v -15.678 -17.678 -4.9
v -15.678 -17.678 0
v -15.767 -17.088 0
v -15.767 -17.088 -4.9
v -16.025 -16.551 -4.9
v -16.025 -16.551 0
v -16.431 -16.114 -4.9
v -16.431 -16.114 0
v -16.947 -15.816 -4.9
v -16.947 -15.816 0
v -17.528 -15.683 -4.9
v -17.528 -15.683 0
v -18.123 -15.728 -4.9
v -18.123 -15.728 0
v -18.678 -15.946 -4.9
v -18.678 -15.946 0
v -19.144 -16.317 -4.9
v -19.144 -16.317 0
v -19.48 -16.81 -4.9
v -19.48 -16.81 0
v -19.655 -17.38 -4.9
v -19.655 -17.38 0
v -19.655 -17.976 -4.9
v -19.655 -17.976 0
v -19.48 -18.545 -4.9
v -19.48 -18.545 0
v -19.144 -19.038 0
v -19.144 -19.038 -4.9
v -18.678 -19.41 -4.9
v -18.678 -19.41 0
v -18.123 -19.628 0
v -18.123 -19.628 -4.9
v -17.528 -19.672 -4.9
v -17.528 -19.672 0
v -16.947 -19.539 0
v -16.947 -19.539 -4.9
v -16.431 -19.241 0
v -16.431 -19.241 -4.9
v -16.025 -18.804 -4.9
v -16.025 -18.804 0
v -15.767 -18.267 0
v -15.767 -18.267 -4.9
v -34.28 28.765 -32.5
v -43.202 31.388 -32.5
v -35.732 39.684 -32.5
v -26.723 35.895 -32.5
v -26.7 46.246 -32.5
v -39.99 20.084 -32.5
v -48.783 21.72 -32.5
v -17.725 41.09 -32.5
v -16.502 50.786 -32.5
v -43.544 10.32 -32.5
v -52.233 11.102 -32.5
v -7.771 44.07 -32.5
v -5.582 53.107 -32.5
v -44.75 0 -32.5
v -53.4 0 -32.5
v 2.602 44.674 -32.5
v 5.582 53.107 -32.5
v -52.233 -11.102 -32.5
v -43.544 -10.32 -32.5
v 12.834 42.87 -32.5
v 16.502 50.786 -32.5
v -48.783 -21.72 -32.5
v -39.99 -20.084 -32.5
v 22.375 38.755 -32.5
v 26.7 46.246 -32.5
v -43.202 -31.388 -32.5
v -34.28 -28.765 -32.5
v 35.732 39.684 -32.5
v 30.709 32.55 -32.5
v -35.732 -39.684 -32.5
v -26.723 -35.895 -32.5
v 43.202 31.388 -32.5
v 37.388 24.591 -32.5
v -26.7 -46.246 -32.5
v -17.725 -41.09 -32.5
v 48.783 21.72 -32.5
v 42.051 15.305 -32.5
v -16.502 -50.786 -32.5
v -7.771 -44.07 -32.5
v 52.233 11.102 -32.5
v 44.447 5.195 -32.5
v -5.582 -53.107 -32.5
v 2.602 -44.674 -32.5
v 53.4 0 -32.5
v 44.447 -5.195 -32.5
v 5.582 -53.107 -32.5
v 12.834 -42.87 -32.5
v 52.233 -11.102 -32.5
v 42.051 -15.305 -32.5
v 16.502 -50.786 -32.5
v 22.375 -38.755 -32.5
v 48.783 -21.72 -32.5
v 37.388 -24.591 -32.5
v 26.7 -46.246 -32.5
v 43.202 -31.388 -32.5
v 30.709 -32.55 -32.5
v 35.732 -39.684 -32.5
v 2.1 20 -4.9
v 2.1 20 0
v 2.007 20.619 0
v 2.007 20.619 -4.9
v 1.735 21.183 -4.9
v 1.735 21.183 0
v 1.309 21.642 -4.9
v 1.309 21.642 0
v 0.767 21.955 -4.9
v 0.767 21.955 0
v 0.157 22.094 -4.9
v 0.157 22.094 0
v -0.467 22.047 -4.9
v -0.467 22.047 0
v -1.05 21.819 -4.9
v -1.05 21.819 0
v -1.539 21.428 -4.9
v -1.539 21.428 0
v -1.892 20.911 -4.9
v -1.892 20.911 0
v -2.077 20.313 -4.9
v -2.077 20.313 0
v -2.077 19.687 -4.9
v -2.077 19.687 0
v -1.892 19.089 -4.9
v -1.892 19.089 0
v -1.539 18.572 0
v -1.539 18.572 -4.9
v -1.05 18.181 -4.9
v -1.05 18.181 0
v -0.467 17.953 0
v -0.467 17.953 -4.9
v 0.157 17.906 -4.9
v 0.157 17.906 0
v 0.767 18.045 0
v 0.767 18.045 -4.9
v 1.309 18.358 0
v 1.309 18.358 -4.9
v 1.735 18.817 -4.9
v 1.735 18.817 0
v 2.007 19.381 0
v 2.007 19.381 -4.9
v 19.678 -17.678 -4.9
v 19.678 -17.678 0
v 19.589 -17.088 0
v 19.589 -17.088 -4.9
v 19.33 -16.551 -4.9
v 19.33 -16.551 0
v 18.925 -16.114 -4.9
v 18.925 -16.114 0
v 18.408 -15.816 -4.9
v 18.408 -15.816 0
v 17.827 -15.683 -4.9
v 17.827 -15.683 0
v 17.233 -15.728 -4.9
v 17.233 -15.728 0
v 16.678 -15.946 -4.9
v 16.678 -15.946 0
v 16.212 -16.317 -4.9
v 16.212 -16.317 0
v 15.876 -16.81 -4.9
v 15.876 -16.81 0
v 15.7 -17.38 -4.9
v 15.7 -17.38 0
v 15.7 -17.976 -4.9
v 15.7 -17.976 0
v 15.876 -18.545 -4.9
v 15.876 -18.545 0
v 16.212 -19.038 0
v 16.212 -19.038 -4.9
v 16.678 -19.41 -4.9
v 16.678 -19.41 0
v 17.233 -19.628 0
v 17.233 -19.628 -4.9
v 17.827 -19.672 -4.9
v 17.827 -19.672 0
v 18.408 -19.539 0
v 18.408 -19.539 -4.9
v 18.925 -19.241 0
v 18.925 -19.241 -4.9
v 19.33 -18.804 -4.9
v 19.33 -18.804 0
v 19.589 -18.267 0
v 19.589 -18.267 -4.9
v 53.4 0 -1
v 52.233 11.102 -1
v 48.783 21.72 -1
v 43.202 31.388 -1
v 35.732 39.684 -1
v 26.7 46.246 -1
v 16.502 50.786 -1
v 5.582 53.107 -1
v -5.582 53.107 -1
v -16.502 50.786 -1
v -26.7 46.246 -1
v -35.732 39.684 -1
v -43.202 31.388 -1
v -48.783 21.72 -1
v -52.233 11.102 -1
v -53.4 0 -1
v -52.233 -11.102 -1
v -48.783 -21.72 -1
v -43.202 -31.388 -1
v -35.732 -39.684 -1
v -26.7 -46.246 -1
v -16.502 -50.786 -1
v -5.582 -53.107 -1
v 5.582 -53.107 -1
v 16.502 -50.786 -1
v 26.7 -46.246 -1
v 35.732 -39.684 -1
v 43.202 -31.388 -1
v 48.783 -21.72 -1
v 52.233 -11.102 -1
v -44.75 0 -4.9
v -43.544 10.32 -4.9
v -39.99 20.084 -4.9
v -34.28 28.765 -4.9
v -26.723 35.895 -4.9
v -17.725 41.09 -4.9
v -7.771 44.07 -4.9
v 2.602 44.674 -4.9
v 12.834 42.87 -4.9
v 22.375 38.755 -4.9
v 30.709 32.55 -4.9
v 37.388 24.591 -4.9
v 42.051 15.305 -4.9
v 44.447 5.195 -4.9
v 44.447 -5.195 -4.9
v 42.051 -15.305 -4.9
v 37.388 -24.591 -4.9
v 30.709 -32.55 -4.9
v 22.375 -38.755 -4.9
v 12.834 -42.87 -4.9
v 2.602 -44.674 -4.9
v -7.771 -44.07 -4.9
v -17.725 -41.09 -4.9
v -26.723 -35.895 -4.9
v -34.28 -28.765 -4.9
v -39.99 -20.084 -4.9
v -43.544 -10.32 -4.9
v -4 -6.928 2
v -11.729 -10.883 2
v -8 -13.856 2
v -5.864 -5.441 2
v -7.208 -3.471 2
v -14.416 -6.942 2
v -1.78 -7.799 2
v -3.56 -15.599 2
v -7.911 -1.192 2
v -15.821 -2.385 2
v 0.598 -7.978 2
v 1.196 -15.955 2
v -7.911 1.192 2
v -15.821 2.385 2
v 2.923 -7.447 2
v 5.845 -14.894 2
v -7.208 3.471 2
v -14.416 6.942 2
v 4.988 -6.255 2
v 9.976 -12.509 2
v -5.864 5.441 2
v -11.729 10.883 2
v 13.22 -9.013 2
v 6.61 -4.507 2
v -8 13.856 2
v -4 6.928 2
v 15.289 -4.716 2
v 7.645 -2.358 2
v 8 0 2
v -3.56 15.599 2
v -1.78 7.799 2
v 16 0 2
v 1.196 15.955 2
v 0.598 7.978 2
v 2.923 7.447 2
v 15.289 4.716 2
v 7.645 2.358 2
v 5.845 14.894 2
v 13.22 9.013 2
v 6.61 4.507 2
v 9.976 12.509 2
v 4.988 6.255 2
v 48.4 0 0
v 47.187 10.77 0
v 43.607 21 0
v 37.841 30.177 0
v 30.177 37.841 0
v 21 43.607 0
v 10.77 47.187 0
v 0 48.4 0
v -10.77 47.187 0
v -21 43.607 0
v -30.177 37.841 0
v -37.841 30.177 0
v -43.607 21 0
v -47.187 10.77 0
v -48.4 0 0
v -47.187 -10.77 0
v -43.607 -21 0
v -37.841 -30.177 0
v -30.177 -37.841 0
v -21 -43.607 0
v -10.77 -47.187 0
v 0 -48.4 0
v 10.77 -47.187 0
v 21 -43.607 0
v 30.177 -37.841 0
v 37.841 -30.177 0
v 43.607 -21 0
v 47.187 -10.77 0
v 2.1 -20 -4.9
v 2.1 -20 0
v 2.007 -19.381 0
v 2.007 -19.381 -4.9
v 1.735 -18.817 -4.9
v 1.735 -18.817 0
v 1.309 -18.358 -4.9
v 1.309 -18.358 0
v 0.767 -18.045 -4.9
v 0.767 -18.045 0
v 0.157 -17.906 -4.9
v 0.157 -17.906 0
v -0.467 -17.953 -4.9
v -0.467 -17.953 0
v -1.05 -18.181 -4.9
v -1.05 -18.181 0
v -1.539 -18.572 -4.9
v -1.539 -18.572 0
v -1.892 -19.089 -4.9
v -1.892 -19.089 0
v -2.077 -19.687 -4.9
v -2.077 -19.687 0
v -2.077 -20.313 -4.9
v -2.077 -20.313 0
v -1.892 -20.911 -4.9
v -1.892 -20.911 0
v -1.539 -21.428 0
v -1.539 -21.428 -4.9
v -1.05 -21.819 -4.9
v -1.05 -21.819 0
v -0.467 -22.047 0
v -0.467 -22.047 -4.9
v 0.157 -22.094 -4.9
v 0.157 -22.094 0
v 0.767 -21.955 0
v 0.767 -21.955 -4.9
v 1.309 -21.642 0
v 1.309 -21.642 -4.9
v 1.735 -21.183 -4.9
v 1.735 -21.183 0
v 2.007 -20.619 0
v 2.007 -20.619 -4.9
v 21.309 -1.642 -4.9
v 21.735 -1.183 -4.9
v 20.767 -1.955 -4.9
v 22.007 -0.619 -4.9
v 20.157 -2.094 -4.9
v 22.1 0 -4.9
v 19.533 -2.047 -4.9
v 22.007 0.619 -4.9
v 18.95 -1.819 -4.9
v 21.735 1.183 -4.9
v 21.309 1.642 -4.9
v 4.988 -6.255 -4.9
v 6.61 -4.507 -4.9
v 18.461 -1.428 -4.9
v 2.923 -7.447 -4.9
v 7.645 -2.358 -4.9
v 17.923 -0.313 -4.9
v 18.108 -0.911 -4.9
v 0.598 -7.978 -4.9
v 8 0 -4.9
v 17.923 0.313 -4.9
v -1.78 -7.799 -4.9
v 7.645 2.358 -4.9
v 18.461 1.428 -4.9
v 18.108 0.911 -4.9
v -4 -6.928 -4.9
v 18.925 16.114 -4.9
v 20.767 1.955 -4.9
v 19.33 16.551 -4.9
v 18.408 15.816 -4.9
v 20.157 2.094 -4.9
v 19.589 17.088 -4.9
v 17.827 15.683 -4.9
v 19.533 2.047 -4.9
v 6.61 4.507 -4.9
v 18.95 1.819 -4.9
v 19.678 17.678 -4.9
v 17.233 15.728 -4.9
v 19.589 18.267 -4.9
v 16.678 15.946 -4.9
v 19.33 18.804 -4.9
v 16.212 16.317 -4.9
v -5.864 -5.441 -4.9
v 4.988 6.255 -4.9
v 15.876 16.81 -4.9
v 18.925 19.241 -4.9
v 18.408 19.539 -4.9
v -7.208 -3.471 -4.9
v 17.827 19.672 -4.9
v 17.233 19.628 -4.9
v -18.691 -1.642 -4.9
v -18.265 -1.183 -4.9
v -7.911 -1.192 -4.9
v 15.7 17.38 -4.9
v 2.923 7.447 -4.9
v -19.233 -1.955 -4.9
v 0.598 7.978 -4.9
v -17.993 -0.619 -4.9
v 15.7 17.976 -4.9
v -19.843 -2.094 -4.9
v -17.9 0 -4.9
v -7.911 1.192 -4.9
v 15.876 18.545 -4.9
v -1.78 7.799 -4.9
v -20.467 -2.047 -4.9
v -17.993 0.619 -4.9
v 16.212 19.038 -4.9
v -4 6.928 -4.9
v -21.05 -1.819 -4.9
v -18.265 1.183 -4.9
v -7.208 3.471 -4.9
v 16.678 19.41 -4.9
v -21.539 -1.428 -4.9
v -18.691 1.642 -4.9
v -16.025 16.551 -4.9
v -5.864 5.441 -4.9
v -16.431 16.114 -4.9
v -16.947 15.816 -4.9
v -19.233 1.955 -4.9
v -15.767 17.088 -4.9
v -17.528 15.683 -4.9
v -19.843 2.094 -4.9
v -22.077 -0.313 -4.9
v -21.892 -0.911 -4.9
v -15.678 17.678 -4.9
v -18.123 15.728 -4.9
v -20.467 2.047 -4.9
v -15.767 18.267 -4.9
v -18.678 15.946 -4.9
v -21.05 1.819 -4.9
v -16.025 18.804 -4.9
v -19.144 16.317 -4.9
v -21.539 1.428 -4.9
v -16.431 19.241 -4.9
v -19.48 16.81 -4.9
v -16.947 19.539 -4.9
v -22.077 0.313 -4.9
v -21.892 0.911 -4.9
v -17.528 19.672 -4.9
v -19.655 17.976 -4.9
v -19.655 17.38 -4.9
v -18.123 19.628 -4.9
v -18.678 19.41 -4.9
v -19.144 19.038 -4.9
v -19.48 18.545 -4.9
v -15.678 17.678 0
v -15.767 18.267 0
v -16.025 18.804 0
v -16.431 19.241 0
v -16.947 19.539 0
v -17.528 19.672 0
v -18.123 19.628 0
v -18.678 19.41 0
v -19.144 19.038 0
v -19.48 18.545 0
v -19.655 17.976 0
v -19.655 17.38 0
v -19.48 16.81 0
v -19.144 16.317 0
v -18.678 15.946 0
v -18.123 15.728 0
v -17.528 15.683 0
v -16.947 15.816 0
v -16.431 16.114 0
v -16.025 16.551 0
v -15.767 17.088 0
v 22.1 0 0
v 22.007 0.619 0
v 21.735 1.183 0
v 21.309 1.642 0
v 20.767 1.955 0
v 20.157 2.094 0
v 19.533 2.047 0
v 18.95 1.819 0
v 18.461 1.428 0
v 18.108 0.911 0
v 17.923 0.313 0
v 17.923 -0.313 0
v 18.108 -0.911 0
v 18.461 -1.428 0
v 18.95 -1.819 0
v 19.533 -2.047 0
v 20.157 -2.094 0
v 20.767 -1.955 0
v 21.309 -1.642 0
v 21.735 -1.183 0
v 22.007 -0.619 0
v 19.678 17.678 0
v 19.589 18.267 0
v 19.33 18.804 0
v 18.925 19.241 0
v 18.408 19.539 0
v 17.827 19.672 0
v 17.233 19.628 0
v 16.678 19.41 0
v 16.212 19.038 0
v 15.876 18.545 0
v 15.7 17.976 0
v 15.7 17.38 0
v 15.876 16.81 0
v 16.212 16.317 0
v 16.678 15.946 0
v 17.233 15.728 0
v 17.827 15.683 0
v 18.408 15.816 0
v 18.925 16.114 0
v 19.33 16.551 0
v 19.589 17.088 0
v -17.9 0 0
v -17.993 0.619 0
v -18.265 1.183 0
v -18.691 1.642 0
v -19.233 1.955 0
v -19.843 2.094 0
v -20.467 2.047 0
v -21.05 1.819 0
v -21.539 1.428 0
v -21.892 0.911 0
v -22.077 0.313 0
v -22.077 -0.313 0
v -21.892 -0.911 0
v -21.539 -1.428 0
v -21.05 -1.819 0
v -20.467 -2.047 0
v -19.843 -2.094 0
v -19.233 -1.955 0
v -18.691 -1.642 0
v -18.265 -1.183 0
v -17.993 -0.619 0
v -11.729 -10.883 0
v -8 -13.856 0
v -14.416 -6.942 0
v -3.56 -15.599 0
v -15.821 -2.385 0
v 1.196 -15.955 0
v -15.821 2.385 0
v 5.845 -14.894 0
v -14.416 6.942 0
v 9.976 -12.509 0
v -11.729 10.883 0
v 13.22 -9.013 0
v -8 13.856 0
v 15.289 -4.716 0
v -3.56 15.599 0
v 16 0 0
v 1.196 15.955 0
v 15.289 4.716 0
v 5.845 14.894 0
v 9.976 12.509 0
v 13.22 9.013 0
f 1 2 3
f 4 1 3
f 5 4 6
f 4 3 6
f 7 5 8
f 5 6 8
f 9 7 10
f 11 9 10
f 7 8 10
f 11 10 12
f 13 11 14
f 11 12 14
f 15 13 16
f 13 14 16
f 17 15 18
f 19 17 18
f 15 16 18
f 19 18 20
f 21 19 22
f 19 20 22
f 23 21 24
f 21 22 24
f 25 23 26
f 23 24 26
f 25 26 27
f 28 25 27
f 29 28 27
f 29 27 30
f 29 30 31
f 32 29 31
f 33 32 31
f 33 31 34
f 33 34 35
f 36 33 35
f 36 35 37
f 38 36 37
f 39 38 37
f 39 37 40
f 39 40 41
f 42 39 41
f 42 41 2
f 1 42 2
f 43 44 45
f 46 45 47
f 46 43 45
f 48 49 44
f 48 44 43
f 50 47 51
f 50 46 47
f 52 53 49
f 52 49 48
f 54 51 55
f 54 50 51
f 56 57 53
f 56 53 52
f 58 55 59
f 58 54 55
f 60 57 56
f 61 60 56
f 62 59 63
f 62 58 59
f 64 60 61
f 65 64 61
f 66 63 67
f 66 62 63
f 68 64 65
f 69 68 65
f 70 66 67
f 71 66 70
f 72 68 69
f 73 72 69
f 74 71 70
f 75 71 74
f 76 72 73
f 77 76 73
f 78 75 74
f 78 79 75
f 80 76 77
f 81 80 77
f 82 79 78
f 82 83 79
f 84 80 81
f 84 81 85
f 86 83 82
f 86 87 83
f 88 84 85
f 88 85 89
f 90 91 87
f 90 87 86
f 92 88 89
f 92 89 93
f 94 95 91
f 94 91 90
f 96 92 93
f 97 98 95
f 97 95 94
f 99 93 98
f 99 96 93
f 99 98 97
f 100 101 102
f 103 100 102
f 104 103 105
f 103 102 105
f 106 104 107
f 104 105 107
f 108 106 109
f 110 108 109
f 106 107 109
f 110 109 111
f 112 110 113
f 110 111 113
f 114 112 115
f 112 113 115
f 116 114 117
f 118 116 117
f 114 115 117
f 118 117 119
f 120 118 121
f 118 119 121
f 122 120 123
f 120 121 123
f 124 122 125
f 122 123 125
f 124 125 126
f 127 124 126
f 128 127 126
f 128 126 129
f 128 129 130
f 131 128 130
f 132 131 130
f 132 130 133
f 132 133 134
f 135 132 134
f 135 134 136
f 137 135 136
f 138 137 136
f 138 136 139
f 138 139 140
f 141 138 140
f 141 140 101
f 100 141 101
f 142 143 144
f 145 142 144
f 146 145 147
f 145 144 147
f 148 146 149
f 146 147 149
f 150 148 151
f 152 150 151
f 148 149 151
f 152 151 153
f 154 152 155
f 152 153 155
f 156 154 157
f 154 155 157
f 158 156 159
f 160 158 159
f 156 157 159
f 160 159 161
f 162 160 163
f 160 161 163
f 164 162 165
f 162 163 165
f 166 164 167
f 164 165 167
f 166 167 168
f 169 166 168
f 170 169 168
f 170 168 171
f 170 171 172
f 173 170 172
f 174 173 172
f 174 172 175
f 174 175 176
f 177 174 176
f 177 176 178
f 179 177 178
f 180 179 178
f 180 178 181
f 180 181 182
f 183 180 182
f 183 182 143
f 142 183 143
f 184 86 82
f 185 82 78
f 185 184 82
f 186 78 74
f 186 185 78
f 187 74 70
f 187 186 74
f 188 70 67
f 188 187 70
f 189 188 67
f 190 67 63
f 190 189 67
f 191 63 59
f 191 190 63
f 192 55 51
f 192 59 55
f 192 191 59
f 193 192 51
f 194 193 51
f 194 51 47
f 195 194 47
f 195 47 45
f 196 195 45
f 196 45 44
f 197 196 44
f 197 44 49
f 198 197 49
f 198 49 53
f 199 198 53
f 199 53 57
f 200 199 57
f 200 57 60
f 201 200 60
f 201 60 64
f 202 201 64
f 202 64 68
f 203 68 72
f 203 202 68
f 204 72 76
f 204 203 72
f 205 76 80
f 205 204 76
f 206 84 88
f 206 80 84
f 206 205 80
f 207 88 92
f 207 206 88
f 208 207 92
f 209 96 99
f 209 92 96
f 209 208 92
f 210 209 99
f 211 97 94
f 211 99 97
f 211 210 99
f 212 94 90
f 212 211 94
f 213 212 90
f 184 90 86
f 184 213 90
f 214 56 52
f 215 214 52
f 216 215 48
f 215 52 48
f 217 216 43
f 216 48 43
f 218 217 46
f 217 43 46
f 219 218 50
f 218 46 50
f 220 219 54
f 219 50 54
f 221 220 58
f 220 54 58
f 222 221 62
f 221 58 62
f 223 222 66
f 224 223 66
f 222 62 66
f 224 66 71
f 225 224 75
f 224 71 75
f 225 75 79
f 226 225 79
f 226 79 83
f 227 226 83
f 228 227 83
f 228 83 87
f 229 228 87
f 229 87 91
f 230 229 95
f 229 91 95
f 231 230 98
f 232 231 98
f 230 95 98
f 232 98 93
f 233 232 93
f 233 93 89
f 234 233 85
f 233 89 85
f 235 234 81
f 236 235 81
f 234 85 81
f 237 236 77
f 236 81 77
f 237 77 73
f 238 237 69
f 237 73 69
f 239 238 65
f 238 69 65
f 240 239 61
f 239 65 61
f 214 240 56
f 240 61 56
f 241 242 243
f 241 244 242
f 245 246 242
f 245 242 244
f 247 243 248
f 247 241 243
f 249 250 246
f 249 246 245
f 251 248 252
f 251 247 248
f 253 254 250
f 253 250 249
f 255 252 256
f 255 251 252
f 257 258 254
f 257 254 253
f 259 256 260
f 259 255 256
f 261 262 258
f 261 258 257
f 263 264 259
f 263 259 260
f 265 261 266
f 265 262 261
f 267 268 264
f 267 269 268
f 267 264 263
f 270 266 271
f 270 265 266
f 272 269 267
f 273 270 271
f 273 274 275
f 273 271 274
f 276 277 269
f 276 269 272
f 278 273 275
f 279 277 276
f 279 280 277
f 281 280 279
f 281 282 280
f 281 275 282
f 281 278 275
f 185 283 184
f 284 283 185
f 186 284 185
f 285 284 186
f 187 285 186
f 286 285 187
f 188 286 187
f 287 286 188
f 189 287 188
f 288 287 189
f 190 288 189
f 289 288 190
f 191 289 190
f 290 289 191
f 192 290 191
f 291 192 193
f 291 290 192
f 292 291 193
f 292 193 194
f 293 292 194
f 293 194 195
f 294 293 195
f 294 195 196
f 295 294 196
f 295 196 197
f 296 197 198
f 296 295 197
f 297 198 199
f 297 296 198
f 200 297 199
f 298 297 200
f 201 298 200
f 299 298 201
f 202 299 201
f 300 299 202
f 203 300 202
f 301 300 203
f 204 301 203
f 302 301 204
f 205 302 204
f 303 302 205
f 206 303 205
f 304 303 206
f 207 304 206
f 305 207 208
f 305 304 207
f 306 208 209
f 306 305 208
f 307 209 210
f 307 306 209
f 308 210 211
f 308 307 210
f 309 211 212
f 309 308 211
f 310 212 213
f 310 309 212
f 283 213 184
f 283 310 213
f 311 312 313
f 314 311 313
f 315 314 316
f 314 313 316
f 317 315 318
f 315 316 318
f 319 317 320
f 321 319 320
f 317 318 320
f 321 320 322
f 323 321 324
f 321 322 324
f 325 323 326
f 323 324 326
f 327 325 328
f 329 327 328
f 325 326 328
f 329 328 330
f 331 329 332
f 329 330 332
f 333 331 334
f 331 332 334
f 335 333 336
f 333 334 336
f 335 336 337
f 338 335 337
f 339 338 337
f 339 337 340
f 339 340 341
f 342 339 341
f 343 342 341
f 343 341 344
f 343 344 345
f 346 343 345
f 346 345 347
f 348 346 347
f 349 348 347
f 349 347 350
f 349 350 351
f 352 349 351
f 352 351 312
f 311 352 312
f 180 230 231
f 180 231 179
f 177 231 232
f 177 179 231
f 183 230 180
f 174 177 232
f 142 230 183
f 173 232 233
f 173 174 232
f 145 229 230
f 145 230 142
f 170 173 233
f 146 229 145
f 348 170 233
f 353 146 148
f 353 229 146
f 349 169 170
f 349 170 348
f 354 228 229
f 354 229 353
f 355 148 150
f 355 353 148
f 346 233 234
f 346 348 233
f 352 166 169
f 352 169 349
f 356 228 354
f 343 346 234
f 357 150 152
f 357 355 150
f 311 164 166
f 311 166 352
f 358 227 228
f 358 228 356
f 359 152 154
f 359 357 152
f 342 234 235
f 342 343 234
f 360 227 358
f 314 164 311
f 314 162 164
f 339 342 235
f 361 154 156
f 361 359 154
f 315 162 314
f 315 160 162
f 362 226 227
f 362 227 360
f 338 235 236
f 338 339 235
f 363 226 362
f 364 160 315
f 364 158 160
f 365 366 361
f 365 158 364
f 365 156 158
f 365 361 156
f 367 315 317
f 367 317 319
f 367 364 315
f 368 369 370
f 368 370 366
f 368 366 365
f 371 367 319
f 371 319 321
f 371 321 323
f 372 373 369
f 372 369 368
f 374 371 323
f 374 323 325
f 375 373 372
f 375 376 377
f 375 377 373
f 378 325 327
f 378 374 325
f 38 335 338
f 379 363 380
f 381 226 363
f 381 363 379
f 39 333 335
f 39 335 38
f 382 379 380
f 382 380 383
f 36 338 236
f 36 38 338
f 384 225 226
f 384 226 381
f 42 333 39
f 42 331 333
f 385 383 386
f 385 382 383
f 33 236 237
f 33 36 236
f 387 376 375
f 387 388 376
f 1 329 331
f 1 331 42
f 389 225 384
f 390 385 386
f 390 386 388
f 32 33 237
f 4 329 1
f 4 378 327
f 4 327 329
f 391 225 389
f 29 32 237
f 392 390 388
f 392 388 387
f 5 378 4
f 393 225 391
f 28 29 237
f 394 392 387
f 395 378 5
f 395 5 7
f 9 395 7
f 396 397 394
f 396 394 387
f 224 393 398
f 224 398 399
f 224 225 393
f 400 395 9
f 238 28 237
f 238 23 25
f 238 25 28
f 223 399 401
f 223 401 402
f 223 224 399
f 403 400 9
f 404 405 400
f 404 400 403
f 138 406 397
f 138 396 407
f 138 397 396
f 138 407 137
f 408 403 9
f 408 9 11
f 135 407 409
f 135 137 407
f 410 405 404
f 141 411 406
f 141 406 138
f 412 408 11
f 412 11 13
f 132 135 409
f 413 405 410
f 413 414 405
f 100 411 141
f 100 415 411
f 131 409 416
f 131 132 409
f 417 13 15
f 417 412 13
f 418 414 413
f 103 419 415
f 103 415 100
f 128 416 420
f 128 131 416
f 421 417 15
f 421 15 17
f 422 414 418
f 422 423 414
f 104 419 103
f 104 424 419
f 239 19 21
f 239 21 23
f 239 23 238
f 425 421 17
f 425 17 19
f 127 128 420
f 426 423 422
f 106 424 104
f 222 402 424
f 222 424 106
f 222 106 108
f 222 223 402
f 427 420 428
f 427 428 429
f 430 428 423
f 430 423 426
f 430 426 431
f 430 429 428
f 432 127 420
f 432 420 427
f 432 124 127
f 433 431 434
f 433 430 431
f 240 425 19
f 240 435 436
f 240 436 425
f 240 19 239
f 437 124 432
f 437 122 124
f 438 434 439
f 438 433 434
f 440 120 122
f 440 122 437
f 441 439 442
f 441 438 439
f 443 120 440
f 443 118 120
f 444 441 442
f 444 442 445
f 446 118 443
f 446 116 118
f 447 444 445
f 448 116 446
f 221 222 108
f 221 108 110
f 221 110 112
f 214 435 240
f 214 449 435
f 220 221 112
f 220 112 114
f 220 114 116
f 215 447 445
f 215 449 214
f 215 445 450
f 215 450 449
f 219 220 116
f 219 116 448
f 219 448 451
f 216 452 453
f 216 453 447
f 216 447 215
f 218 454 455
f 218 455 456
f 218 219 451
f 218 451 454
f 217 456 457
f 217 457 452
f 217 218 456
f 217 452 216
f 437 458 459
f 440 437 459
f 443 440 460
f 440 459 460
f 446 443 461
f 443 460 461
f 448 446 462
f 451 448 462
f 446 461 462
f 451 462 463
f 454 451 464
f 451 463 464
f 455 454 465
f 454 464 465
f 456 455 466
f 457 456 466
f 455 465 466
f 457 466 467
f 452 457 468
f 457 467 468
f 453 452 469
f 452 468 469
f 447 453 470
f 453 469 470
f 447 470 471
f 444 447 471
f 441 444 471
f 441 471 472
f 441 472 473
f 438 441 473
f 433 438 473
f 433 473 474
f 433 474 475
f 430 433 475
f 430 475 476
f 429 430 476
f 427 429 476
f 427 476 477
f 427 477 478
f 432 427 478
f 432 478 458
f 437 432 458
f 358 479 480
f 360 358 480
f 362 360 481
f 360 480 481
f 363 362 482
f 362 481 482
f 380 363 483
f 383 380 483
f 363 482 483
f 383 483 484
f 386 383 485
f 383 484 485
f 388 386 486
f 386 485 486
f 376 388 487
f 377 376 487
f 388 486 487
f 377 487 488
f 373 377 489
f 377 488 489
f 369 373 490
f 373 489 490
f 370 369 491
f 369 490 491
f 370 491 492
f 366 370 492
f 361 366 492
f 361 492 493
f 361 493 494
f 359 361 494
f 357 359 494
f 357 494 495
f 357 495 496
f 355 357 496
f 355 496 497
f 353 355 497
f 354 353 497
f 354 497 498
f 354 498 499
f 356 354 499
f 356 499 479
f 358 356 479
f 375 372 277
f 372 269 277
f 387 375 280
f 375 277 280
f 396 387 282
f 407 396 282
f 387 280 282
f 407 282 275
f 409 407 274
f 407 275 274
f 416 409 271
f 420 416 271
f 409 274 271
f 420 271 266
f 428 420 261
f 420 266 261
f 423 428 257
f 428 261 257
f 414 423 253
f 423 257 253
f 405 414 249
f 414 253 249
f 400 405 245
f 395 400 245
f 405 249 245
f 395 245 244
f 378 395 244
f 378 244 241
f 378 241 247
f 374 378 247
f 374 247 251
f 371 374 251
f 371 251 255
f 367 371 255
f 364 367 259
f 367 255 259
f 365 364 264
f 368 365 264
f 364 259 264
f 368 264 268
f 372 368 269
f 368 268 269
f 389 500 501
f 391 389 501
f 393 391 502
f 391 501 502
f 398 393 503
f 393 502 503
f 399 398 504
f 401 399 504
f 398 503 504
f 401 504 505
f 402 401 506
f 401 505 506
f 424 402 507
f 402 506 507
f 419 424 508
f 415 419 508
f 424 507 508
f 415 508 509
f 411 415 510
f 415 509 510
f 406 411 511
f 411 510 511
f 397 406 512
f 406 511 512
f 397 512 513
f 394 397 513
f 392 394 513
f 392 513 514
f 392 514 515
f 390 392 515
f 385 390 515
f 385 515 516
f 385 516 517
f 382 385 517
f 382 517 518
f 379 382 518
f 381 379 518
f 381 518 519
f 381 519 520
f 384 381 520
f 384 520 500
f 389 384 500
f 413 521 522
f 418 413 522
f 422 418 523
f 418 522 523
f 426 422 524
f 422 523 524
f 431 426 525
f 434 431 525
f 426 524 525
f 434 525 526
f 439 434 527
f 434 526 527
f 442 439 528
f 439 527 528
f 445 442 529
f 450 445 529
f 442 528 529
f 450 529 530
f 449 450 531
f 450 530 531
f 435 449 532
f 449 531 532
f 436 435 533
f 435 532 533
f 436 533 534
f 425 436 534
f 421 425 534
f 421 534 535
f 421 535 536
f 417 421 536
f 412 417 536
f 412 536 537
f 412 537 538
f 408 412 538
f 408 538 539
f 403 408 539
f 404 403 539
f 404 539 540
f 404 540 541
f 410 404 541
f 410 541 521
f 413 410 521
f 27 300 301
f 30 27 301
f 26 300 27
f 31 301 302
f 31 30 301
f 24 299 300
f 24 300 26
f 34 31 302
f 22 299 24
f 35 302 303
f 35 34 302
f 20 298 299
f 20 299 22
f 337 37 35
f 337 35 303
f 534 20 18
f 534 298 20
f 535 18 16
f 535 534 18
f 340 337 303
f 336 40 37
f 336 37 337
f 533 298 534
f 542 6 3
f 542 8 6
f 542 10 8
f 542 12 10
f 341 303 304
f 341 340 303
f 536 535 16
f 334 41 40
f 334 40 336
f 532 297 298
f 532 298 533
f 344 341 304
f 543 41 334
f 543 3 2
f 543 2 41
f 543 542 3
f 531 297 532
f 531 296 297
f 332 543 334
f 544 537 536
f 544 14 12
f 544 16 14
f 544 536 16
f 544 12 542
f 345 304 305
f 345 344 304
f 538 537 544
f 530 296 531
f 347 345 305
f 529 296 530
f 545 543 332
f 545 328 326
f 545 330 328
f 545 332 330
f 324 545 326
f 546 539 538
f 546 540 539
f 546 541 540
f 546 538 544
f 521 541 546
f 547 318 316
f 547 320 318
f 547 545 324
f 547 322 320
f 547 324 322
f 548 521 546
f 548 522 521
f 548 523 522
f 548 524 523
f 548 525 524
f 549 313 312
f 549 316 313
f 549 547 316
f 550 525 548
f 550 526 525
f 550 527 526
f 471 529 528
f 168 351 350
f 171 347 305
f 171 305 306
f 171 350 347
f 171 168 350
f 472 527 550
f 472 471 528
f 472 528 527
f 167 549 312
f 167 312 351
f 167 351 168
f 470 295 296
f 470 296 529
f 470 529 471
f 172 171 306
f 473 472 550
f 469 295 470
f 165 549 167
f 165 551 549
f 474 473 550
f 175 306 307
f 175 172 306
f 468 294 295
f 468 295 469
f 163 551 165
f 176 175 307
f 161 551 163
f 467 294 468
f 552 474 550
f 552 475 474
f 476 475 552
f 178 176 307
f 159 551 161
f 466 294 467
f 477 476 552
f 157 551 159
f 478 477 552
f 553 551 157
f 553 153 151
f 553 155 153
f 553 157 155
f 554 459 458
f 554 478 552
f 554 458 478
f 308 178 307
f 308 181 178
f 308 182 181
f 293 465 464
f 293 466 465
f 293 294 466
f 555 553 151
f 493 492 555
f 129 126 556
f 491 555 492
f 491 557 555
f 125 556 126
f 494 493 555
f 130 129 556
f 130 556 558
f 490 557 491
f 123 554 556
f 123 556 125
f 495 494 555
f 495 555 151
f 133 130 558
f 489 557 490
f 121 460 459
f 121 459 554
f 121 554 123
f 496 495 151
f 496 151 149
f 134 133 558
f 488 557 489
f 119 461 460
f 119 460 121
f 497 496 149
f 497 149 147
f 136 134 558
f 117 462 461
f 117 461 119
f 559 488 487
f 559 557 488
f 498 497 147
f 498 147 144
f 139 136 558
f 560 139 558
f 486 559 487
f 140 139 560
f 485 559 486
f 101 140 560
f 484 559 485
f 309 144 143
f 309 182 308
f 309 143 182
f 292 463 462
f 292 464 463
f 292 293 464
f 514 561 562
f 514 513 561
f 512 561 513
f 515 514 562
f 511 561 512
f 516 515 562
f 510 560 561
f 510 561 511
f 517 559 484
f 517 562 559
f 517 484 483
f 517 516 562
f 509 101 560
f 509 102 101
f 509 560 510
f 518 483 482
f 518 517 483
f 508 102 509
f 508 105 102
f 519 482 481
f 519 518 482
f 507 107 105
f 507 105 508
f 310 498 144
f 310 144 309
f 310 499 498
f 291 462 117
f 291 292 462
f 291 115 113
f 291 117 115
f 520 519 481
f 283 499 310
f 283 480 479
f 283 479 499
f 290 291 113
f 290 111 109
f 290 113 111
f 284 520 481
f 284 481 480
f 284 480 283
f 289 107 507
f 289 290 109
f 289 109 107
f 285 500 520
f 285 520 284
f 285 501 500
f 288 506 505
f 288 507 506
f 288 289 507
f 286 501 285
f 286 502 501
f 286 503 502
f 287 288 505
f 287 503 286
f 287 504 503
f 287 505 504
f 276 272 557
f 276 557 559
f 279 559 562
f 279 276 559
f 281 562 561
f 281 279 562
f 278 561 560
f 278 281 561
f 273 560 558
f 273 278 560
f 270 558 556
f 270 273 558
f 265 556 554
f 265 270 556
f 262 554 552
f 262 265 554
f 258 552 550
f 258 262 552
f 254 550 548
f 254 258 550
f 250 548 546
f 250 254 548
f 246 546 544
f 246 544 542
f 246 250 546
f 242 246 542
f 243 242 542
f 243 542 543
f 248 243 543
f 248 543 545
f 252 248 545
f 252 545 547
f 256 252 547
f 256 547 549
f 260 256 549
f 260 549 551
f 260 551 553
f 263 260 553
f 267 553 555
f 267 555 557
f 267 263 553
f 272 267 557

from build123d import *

# Parameters (mm, degrees)
SKETCH3_R           = 53.4
BOSS_EXTRUDE1_DEPTH = 38.5
SKETCH4_R           = 8
CUT_EXTRUDE1_DEPTH  = 85.766561804
SKETCH5_R           = 2
CUT_EXTRUDE2_DEPTH  = 20
BOSS_EXTRUDE3_START = 2
SKETCH6_R           = 16
SKETCH6_R_2         = 8
BOSS_EXTRUDE3_DEPTH = 2
SKETCH7_R           = 2.1
CUT_EXTRUDE3_DEPTH  = 20
SKETCH8_R           = 2.5
CUT_EXTRUDE4_DEPTH  = 20
CHAMFER1_SIZE       = 1
CHAMFER1_SIZE2      = 5
CUT_EXTRUDE5_START  = -6
SKETCH9_R           = 53.4
CUT_EXTRUDE5_DEPTH  = 6
SKETCH10_R          = 44.75
CUT_EXTRUDE6_DEPTH  = 27.6


with BuildPart() as part:
    # Sketch3 → Boss-Extrude1 (new body)
    with BuildSketch(Plane.XY):
        Circle(SKETCH3_R)
    extrude(amount=-BOSS_EXTRUDE1_DEPTH)

    # Sketch4 → Cut-Extrude1 (cut, through all)
    with BuildSketch(Plane.XY):
        Circle(SKETCH4_R)
    extrude(amount=-CUT_EXTRUDE1_DEPTH, mode=Mode.SUBTRACT)

    # Sketch5 → Cut-Extrude2 (cut)
    with BuildSketch(Plane.XY):
        with Locations((-17.67766953, 17.67766953)):
            Circle(SKETCH5_R)
        with Locations((17.67766953, 17.67766953)):
            Circle(SKETCH5_R)
        with Locations((-17.67766953, -17.67766953)):
            Circle(SKETCH5_R)
        with Locations((17.67766953, -17.67766953)):
            Circle(SKETCH5_R)
    extrude(amount=-CUT_EXTRUDE2_DEPTH, mode=Mode.SUBTRACT)

    # Sketch6 → Boss-Extrude3 (add)
    with BuildSketch(Plane.XY.offset(BOSS_EXTRUDE3_START)):
        Circle(SKETCH6_R)
        Circle(SKETCH6_R_2, mode=Mode.SUBTRACT)
    extrude(amount=-BOSS_EXTRUDE3_DEPTH)

    # Sketch7 → Cut-Extrude3 (cut)
    with BuildSketch(Plane.XY):
        with Locations((0, 20)):
            Circle(SKETCH7_R)
        with Locations((20, 0)):
            Circle(SKETCH7_R)
        with Locations((-20, 0)):
            Circle(SKETCH7_R)
        with Locations((0, -20)):
            Circle(SKETCH7_R)
    extrude(amount=-CUT_EXTRUDE3_DEPTH, mode=Mode.SUBTRACT)

    # Sketch8 → Cut-Extrude4 (cut)
    with BuildSketch(Plane(origin=(0, 0, -38.5), x_dir=(-1, 0, 0), z_dir=(0, 0, -1))):
        with Locations((0, 30)):
            Circle(SKETCH8_R)
        with Locations((30, 0)):
            Circle(SKETCH8_R)
        with Locations((0, -30)):
            Circle(SKETCH8_R)
        with Locations((-30, 0)):
            Circle(SKETCH8_R)
    extrude(amount=-CUT_EXTRUDE4_DEPTH, mode=Mode.SUBTRACT)

    # Chamfer1
    chamfer1_edges = [part.edges().sort_by_distance(p)[0] for p in [
        (-53.4, 0, 0),
    ]]
    chamfer1_side = [part.faces().sort_by_distance(p)[0] for p in [
        (-53.4, 0, -19.25),
    ]]
    chamfer(chamfer1_edges, length=CHAMFER1_SIZE, length2=CHAMFER1_SIZE2, reference=chamfer1_side[0])

    # Sketch9 → Cut-Extrude5 (cut)
    with BuildSketch(Plane(origin=(0, 0, -38.5), x_dir=(-1, 0, 0), z_dir=(0, 0, -1)).offset(CUT_EXTRUDE5_START)):
        with Locations(Location((0, 0, 0), (0, 0, 180))):
            Circle(SKETCH9_R)
    extrude(amount=CUT_EXTRUDE5_DEPTH, mode=Mode.SUBTRACT)

    # Sketch10 → Cut-Extrude6 (cut)
    with BuildSketch(Plane(origin=(0, 0, -32.5), x_dir=(-1, 0, 0), z_dir=(0, 0, -1))):
        Circle(SKETCH10_R)
    extrude(amount=-CUT_EXTRUDE6_DEPTH, mode=Mode.SUBTRACT)


solid = part.part
